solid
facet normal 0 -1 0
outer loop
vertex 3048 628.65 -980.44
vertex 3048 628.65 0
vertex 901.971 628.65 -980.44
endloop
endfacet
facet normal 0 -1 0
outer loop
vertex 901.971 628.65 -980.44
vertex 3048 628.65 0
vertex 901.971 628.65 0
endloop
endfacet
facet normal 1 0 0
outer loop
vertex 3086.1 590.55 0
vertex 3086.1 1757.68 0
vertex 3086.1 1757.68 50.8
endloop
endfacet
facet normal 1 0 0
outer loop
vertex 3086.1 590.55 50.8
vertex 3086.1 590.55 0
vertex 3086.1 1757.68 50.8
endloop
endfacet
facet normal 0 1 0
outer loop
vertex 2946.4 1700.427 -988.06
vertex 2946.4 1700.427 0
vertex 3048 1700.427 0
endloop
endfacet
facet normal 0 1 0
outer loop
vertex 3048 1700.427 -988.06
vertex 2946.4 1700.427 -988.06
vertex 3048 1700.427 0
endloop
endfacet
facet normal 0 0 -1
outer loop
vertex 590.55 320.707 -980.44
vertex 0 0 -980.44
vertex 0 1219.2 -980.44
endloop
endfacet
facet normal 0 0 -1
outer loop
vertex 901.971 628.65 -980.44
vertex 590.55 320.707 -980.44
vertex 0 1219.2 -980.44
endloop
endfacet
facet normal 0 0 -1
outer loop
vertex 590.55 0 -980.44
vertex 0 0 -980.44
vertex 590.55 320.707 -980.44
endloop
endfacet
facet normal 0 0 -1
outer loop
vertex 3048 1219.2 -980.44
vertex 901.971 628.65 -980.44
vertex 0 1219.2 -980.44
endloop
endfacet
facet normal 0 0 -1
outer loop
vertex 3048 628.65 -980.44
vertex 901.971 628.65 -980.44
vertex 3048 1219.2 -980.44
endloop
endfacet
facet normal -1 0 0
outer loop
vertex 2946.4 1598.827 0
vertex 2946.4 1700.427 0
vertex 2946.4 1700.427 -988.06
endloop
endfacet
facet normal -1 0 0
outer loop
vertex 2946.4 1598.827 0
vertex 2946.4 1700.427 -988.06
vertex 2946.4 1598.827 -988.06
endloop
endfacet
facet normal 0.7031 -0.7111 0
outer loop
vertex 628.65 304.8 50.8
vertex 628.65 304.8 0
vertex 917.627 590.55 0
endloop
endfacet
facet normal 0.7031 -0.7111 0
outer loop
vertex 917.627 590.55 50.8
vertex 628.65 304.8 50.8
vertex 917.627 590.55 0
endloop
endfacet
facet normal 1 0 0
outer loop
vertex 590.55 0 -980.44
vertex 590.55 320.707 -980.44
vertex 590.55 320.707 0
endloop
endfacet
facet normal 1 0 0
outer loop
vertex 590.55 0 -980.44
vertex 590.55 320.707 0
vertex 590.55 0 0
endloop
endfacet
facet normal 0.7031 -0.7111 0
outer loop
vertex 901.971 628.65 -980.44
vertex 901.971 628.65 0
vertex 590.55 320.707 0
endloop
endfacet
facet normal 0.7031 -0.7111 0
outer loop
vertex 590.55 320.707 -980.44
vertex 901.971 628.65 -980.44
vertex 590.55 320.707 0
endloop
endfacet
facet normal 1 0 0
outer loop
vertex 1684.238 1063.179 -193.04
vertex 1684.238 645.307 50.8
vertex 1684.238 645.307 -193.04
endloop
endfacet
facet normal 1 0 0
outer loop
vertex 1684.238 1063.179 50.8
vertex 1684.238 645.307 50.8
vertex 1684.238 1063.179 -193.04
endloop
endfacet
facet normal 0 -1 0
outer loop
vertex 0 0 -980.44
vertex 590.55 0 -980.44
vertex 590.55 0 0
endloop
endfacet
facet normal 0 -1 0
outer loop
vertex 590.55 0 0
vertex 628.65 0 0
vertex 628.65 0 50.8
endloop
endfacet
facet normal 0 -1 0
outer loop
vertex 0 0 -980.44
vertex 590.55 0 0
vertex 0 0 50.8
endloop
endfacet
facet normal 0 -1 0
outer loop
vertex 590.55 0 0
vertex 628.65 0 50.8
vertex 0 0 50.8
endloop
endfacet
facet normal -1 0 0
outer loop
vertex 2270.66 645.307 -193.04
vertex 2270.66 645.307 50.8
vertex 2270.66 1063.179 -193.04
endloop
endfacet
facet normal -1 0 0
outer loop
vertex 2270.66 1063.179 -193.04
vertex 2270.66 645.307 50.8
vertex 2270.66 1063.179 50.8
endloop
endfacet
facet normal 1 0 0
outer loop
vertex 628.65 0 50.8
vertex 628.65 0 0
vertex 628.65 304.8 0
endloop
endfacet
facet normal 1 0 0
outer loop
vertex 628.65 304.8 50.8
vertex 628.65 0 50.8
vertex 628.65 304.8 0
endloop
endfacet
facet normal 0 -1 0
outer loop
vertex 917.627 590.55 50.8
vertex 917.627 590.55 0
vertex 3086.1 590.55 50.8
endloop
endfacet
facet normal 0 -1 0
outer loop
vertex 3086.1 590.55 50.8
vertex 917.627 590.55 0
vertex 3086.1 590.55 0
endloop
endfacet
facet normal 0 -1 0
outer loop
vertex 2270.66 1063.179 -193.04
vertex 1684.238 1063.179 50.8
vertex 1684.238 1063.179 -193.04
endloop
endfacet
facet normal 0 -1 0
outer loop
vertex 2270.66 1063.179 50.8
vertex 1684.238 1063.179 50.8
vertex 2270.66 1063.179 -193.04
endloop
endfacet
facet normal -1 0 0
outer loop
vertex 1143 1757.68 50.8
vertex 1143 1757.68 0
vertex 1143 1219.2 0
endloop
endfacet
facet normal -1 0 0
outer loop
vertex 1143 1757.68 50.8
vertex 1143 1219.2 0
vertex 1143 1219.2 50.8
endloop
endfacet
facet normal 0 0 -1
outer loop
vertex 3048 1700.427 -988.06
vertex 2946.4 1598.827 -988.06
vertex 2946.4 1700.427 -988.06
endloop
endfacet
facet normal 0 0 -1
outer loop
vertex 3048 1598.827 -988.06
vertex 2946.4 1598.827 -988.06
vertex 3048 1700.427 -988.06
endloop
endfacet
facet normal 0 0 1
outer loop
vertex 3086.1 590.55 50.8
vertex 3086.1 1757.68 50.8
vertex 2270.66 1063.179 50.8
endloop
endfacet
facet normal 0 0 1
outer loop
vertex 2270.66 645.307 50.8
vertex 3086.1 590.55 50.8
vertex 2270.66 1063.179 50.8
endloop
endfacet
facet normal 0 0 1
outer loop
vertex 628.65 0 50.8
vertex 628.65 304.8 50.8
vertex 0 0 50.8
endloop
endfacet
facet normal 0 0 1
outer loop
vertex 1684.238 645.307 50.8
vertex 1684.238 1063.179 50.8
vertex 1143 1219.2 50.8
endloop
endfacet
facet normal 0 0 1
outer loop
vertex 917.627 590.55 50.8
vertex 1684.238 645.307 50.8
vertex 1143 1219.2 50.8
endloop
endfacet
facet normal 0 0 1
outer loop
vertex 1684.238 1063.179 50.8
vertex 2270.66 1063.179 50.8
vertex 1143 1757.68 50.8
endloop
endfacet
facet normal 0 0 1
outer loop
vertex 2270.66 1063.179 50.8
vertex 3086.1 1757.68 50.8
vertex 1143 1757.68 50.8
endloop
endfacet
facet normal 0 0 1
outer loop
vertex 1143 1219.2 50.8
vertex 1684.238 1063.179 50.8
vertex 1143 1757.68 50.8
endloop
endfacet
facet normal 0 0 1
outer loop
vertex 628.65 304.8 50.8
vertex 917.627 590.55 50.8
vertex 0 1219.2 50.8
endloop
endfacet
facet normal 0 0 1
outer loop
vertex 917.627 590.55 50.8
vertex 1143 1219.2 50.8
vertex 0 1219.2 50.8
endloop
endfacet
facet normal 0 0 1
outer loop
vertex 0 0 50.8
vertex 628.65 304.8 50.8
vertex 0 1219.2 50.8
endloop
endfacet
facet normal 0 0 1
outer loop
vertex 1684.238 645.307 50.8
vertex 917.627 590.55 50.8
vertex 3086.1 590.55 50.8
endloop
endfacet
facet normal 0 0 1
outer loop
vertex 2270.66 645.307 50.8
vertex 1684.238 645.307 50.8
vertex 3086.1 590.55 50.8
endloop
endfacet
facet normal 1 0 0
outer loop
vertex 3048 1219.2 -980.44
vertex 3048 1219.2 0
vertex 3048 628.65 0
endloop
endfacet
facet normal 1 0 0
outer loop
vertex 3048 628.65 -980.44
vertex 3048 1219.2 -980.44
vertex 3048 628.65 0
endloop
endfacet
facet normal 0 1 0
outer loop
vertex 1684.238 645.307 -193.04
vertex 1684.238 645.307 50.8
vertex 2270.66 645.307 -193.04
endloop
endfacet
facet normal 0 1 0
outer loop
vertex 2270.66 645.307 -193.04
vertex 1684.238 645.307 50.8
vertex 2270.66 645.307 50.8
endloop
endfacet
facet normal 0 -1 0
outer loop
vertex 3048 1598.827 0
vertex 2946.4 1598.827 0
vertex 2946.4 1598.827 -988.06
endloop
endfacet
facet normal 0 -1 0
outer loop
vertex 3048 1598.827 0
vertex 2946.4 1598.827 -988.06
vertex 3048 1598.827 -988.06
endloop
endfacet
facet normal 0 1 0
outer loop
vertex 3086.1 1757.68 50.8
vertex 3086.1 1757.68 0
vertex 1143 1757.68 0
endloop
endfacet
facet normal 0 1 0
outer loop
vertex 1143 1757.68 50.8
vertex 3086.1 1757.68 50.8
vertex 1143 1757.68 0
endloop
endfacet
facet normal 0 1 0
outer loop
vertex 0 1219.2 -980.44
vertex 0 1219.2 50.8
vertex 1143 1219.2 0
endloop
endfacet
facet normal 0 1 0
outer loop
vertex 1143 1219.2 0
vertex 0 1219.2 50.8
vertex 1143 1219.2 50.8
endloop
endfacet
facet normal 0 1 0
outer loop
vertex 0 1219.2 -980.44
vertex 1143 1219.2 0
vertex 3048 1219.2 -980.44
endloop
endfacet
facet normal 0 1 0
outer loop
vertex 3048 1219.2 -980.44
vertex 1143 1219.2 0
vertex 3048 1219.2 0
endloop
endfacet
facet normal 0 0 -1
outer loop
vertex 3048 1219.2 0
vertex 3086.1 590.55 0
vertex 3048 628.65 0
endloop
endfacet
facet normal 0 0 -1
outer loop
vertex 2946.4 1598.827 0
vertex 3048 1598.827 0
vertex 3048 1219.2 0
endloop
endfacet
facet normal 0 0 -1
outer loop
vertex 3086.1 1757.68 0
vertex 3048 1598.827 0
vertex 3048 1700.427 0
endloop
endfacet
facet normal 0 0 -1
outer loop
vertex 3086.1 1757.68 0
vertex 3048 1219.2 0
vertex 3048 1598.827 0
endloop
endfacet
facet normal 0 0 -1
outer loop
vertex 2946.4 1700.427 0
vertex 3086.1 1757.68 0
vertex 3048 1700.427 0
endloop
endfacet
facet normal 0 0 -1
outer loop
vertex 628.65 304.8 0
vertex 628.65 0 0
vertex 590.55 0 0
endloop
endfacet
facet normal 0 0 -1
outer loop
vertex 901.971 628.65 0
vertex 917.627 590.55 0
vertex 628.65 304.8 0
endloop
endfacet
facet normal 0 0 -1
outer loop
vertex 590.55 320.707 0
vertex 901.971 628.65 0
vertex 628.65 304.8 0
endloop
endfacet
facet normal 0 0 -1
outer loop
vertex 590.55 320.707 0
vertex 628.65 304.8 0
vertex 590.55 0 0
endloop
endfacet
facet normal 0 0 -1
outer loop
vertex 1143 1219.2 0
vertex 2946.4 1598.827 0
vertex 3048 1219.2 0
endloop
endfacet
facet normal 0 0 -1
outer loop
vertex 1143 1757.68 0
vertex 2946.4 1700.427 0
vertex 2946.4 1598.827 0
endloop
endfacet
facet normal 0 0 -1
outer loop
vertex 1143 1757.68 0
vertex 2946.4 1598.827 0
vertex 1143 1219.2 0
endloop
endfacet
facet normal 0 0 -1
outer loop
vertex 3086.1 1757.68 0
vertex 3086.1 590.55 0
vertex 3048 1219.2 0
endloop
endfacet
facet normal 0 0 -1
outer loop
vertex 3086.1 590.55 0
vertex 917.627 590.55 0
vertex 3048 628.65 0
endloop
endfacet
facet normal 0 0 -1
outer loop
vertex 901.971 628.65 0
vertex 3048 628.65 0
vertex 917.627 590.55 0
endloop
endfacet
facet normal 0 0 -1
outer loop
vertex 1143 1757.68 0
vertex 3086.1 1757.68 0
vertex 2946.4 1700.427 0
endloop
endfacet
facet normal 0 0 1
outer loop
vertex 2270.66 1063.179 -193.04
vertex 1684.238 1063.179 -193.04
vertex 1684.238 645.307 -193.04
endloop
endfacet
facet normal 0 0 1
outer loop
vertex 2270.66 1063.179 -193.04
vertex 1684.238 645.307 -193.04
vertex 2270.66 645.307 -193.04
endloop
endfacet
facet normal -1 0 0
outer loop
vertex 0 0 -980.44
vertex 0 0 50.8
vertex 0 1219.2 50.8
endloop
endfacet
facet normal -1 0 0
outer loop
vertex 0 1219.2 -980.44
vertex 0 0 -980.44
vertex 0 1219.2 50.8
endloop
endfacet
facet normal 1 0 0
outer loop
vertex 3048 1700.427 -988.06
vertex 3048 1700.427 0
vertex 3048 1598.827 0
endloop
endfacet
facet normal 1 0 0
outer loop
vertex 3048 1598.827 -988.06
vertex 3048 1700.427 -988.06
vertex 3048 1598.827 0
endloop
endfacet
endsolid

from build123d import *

# Parameters (mm, degrees)
F1_DEPTH  = 50.8
F3_DEPTH  = 980.44
F4_DEPTH  = 467.36
F5_W      = 101.6
F5_H      = 101.6
F6_DEPTH  = 988.06
F7_W      = 586.4219665527
F7_H      = 417.872607708
F8_DEPTH  = 243.84
F9_DEPTH  = 248.92
F10_DEPTH = 233.68


with BuildPart() as f1:
    # F0 (on Top) → F1 (new body)
    with BuildSketch(Plane.XY):
        Polygon((0, 1219.2), (0, 0), (628.65, 0), (628.65, 304.8), (917.6273304258, 590.55), (3086.1, 590.55), (3086.1, 1524), (1143, 1524), (1143, 1219.2), align=None)
    extrude(amount=F1_DEPTH)

    # F2 (on face) → F3 (join)
    with BuildSketch(Plane(origin=(0, 0, 0), x_dir=(1, 0, 0), z_dir=(0, 0, -1))):
        Polygon((0, -1219.2), (1143, -1219.2), (3048, -1219.2), (3048, -628.65), (901.9709744825, -628.65), (590.55, -320.7070090143), (590.55, 0), (0, 0), align=None)
    extrude(amount=F3_DEPTH)

    # F4 (add): a face of the model
    f4_faces = [f1.faces().sort_by_distance(p)[0] for p in [
        (2114.55, 1524, 25.4),
    ]]
    extrude(f4_faces, amount=F4_DEPTH)

    # F5 (on face) → F6 (join)
    with BuildSketch(Plane(origin=(0, 0, 0), x_dir=(1, 0, 0), z_dir=(0, 0, -1))):
        with Locations((2997.2, -1649.6268852234)):
            Rectangle(F5_W, F5_H)
    extrude(amount=F6_DEPTH)

    # F7 (on face) → F8 (cut)
    with BuildSketch(Plane.XY.offset(50.8)):
        with Locations((1977.4491786957, 854.2429506779)):
            Rectangle(F7_W, F7_H)
    extrude(amount=-F8_DEPTH, mode=Mode.SUBTRACT)

    # F9 (add): a face of the model
    f9_faces = [f1.faces().sort_by_distance(p)[0] for p in [
        (2114.55, 1991.36, 25.4),
    ]]
    extrude(f9_faces, amount=-F9_DEPTH)

    # F10 (cut): a face of the model
    f10_faces = [f1.faces().sort_by_distance(p)[0] for p in [
        (2114.55, 1991.36, 25.4),
    ]]
    extrude(f10_faces, amount=-F10_DEPTH, mode=Mode.SUBTRACT)


solid = f1.part
